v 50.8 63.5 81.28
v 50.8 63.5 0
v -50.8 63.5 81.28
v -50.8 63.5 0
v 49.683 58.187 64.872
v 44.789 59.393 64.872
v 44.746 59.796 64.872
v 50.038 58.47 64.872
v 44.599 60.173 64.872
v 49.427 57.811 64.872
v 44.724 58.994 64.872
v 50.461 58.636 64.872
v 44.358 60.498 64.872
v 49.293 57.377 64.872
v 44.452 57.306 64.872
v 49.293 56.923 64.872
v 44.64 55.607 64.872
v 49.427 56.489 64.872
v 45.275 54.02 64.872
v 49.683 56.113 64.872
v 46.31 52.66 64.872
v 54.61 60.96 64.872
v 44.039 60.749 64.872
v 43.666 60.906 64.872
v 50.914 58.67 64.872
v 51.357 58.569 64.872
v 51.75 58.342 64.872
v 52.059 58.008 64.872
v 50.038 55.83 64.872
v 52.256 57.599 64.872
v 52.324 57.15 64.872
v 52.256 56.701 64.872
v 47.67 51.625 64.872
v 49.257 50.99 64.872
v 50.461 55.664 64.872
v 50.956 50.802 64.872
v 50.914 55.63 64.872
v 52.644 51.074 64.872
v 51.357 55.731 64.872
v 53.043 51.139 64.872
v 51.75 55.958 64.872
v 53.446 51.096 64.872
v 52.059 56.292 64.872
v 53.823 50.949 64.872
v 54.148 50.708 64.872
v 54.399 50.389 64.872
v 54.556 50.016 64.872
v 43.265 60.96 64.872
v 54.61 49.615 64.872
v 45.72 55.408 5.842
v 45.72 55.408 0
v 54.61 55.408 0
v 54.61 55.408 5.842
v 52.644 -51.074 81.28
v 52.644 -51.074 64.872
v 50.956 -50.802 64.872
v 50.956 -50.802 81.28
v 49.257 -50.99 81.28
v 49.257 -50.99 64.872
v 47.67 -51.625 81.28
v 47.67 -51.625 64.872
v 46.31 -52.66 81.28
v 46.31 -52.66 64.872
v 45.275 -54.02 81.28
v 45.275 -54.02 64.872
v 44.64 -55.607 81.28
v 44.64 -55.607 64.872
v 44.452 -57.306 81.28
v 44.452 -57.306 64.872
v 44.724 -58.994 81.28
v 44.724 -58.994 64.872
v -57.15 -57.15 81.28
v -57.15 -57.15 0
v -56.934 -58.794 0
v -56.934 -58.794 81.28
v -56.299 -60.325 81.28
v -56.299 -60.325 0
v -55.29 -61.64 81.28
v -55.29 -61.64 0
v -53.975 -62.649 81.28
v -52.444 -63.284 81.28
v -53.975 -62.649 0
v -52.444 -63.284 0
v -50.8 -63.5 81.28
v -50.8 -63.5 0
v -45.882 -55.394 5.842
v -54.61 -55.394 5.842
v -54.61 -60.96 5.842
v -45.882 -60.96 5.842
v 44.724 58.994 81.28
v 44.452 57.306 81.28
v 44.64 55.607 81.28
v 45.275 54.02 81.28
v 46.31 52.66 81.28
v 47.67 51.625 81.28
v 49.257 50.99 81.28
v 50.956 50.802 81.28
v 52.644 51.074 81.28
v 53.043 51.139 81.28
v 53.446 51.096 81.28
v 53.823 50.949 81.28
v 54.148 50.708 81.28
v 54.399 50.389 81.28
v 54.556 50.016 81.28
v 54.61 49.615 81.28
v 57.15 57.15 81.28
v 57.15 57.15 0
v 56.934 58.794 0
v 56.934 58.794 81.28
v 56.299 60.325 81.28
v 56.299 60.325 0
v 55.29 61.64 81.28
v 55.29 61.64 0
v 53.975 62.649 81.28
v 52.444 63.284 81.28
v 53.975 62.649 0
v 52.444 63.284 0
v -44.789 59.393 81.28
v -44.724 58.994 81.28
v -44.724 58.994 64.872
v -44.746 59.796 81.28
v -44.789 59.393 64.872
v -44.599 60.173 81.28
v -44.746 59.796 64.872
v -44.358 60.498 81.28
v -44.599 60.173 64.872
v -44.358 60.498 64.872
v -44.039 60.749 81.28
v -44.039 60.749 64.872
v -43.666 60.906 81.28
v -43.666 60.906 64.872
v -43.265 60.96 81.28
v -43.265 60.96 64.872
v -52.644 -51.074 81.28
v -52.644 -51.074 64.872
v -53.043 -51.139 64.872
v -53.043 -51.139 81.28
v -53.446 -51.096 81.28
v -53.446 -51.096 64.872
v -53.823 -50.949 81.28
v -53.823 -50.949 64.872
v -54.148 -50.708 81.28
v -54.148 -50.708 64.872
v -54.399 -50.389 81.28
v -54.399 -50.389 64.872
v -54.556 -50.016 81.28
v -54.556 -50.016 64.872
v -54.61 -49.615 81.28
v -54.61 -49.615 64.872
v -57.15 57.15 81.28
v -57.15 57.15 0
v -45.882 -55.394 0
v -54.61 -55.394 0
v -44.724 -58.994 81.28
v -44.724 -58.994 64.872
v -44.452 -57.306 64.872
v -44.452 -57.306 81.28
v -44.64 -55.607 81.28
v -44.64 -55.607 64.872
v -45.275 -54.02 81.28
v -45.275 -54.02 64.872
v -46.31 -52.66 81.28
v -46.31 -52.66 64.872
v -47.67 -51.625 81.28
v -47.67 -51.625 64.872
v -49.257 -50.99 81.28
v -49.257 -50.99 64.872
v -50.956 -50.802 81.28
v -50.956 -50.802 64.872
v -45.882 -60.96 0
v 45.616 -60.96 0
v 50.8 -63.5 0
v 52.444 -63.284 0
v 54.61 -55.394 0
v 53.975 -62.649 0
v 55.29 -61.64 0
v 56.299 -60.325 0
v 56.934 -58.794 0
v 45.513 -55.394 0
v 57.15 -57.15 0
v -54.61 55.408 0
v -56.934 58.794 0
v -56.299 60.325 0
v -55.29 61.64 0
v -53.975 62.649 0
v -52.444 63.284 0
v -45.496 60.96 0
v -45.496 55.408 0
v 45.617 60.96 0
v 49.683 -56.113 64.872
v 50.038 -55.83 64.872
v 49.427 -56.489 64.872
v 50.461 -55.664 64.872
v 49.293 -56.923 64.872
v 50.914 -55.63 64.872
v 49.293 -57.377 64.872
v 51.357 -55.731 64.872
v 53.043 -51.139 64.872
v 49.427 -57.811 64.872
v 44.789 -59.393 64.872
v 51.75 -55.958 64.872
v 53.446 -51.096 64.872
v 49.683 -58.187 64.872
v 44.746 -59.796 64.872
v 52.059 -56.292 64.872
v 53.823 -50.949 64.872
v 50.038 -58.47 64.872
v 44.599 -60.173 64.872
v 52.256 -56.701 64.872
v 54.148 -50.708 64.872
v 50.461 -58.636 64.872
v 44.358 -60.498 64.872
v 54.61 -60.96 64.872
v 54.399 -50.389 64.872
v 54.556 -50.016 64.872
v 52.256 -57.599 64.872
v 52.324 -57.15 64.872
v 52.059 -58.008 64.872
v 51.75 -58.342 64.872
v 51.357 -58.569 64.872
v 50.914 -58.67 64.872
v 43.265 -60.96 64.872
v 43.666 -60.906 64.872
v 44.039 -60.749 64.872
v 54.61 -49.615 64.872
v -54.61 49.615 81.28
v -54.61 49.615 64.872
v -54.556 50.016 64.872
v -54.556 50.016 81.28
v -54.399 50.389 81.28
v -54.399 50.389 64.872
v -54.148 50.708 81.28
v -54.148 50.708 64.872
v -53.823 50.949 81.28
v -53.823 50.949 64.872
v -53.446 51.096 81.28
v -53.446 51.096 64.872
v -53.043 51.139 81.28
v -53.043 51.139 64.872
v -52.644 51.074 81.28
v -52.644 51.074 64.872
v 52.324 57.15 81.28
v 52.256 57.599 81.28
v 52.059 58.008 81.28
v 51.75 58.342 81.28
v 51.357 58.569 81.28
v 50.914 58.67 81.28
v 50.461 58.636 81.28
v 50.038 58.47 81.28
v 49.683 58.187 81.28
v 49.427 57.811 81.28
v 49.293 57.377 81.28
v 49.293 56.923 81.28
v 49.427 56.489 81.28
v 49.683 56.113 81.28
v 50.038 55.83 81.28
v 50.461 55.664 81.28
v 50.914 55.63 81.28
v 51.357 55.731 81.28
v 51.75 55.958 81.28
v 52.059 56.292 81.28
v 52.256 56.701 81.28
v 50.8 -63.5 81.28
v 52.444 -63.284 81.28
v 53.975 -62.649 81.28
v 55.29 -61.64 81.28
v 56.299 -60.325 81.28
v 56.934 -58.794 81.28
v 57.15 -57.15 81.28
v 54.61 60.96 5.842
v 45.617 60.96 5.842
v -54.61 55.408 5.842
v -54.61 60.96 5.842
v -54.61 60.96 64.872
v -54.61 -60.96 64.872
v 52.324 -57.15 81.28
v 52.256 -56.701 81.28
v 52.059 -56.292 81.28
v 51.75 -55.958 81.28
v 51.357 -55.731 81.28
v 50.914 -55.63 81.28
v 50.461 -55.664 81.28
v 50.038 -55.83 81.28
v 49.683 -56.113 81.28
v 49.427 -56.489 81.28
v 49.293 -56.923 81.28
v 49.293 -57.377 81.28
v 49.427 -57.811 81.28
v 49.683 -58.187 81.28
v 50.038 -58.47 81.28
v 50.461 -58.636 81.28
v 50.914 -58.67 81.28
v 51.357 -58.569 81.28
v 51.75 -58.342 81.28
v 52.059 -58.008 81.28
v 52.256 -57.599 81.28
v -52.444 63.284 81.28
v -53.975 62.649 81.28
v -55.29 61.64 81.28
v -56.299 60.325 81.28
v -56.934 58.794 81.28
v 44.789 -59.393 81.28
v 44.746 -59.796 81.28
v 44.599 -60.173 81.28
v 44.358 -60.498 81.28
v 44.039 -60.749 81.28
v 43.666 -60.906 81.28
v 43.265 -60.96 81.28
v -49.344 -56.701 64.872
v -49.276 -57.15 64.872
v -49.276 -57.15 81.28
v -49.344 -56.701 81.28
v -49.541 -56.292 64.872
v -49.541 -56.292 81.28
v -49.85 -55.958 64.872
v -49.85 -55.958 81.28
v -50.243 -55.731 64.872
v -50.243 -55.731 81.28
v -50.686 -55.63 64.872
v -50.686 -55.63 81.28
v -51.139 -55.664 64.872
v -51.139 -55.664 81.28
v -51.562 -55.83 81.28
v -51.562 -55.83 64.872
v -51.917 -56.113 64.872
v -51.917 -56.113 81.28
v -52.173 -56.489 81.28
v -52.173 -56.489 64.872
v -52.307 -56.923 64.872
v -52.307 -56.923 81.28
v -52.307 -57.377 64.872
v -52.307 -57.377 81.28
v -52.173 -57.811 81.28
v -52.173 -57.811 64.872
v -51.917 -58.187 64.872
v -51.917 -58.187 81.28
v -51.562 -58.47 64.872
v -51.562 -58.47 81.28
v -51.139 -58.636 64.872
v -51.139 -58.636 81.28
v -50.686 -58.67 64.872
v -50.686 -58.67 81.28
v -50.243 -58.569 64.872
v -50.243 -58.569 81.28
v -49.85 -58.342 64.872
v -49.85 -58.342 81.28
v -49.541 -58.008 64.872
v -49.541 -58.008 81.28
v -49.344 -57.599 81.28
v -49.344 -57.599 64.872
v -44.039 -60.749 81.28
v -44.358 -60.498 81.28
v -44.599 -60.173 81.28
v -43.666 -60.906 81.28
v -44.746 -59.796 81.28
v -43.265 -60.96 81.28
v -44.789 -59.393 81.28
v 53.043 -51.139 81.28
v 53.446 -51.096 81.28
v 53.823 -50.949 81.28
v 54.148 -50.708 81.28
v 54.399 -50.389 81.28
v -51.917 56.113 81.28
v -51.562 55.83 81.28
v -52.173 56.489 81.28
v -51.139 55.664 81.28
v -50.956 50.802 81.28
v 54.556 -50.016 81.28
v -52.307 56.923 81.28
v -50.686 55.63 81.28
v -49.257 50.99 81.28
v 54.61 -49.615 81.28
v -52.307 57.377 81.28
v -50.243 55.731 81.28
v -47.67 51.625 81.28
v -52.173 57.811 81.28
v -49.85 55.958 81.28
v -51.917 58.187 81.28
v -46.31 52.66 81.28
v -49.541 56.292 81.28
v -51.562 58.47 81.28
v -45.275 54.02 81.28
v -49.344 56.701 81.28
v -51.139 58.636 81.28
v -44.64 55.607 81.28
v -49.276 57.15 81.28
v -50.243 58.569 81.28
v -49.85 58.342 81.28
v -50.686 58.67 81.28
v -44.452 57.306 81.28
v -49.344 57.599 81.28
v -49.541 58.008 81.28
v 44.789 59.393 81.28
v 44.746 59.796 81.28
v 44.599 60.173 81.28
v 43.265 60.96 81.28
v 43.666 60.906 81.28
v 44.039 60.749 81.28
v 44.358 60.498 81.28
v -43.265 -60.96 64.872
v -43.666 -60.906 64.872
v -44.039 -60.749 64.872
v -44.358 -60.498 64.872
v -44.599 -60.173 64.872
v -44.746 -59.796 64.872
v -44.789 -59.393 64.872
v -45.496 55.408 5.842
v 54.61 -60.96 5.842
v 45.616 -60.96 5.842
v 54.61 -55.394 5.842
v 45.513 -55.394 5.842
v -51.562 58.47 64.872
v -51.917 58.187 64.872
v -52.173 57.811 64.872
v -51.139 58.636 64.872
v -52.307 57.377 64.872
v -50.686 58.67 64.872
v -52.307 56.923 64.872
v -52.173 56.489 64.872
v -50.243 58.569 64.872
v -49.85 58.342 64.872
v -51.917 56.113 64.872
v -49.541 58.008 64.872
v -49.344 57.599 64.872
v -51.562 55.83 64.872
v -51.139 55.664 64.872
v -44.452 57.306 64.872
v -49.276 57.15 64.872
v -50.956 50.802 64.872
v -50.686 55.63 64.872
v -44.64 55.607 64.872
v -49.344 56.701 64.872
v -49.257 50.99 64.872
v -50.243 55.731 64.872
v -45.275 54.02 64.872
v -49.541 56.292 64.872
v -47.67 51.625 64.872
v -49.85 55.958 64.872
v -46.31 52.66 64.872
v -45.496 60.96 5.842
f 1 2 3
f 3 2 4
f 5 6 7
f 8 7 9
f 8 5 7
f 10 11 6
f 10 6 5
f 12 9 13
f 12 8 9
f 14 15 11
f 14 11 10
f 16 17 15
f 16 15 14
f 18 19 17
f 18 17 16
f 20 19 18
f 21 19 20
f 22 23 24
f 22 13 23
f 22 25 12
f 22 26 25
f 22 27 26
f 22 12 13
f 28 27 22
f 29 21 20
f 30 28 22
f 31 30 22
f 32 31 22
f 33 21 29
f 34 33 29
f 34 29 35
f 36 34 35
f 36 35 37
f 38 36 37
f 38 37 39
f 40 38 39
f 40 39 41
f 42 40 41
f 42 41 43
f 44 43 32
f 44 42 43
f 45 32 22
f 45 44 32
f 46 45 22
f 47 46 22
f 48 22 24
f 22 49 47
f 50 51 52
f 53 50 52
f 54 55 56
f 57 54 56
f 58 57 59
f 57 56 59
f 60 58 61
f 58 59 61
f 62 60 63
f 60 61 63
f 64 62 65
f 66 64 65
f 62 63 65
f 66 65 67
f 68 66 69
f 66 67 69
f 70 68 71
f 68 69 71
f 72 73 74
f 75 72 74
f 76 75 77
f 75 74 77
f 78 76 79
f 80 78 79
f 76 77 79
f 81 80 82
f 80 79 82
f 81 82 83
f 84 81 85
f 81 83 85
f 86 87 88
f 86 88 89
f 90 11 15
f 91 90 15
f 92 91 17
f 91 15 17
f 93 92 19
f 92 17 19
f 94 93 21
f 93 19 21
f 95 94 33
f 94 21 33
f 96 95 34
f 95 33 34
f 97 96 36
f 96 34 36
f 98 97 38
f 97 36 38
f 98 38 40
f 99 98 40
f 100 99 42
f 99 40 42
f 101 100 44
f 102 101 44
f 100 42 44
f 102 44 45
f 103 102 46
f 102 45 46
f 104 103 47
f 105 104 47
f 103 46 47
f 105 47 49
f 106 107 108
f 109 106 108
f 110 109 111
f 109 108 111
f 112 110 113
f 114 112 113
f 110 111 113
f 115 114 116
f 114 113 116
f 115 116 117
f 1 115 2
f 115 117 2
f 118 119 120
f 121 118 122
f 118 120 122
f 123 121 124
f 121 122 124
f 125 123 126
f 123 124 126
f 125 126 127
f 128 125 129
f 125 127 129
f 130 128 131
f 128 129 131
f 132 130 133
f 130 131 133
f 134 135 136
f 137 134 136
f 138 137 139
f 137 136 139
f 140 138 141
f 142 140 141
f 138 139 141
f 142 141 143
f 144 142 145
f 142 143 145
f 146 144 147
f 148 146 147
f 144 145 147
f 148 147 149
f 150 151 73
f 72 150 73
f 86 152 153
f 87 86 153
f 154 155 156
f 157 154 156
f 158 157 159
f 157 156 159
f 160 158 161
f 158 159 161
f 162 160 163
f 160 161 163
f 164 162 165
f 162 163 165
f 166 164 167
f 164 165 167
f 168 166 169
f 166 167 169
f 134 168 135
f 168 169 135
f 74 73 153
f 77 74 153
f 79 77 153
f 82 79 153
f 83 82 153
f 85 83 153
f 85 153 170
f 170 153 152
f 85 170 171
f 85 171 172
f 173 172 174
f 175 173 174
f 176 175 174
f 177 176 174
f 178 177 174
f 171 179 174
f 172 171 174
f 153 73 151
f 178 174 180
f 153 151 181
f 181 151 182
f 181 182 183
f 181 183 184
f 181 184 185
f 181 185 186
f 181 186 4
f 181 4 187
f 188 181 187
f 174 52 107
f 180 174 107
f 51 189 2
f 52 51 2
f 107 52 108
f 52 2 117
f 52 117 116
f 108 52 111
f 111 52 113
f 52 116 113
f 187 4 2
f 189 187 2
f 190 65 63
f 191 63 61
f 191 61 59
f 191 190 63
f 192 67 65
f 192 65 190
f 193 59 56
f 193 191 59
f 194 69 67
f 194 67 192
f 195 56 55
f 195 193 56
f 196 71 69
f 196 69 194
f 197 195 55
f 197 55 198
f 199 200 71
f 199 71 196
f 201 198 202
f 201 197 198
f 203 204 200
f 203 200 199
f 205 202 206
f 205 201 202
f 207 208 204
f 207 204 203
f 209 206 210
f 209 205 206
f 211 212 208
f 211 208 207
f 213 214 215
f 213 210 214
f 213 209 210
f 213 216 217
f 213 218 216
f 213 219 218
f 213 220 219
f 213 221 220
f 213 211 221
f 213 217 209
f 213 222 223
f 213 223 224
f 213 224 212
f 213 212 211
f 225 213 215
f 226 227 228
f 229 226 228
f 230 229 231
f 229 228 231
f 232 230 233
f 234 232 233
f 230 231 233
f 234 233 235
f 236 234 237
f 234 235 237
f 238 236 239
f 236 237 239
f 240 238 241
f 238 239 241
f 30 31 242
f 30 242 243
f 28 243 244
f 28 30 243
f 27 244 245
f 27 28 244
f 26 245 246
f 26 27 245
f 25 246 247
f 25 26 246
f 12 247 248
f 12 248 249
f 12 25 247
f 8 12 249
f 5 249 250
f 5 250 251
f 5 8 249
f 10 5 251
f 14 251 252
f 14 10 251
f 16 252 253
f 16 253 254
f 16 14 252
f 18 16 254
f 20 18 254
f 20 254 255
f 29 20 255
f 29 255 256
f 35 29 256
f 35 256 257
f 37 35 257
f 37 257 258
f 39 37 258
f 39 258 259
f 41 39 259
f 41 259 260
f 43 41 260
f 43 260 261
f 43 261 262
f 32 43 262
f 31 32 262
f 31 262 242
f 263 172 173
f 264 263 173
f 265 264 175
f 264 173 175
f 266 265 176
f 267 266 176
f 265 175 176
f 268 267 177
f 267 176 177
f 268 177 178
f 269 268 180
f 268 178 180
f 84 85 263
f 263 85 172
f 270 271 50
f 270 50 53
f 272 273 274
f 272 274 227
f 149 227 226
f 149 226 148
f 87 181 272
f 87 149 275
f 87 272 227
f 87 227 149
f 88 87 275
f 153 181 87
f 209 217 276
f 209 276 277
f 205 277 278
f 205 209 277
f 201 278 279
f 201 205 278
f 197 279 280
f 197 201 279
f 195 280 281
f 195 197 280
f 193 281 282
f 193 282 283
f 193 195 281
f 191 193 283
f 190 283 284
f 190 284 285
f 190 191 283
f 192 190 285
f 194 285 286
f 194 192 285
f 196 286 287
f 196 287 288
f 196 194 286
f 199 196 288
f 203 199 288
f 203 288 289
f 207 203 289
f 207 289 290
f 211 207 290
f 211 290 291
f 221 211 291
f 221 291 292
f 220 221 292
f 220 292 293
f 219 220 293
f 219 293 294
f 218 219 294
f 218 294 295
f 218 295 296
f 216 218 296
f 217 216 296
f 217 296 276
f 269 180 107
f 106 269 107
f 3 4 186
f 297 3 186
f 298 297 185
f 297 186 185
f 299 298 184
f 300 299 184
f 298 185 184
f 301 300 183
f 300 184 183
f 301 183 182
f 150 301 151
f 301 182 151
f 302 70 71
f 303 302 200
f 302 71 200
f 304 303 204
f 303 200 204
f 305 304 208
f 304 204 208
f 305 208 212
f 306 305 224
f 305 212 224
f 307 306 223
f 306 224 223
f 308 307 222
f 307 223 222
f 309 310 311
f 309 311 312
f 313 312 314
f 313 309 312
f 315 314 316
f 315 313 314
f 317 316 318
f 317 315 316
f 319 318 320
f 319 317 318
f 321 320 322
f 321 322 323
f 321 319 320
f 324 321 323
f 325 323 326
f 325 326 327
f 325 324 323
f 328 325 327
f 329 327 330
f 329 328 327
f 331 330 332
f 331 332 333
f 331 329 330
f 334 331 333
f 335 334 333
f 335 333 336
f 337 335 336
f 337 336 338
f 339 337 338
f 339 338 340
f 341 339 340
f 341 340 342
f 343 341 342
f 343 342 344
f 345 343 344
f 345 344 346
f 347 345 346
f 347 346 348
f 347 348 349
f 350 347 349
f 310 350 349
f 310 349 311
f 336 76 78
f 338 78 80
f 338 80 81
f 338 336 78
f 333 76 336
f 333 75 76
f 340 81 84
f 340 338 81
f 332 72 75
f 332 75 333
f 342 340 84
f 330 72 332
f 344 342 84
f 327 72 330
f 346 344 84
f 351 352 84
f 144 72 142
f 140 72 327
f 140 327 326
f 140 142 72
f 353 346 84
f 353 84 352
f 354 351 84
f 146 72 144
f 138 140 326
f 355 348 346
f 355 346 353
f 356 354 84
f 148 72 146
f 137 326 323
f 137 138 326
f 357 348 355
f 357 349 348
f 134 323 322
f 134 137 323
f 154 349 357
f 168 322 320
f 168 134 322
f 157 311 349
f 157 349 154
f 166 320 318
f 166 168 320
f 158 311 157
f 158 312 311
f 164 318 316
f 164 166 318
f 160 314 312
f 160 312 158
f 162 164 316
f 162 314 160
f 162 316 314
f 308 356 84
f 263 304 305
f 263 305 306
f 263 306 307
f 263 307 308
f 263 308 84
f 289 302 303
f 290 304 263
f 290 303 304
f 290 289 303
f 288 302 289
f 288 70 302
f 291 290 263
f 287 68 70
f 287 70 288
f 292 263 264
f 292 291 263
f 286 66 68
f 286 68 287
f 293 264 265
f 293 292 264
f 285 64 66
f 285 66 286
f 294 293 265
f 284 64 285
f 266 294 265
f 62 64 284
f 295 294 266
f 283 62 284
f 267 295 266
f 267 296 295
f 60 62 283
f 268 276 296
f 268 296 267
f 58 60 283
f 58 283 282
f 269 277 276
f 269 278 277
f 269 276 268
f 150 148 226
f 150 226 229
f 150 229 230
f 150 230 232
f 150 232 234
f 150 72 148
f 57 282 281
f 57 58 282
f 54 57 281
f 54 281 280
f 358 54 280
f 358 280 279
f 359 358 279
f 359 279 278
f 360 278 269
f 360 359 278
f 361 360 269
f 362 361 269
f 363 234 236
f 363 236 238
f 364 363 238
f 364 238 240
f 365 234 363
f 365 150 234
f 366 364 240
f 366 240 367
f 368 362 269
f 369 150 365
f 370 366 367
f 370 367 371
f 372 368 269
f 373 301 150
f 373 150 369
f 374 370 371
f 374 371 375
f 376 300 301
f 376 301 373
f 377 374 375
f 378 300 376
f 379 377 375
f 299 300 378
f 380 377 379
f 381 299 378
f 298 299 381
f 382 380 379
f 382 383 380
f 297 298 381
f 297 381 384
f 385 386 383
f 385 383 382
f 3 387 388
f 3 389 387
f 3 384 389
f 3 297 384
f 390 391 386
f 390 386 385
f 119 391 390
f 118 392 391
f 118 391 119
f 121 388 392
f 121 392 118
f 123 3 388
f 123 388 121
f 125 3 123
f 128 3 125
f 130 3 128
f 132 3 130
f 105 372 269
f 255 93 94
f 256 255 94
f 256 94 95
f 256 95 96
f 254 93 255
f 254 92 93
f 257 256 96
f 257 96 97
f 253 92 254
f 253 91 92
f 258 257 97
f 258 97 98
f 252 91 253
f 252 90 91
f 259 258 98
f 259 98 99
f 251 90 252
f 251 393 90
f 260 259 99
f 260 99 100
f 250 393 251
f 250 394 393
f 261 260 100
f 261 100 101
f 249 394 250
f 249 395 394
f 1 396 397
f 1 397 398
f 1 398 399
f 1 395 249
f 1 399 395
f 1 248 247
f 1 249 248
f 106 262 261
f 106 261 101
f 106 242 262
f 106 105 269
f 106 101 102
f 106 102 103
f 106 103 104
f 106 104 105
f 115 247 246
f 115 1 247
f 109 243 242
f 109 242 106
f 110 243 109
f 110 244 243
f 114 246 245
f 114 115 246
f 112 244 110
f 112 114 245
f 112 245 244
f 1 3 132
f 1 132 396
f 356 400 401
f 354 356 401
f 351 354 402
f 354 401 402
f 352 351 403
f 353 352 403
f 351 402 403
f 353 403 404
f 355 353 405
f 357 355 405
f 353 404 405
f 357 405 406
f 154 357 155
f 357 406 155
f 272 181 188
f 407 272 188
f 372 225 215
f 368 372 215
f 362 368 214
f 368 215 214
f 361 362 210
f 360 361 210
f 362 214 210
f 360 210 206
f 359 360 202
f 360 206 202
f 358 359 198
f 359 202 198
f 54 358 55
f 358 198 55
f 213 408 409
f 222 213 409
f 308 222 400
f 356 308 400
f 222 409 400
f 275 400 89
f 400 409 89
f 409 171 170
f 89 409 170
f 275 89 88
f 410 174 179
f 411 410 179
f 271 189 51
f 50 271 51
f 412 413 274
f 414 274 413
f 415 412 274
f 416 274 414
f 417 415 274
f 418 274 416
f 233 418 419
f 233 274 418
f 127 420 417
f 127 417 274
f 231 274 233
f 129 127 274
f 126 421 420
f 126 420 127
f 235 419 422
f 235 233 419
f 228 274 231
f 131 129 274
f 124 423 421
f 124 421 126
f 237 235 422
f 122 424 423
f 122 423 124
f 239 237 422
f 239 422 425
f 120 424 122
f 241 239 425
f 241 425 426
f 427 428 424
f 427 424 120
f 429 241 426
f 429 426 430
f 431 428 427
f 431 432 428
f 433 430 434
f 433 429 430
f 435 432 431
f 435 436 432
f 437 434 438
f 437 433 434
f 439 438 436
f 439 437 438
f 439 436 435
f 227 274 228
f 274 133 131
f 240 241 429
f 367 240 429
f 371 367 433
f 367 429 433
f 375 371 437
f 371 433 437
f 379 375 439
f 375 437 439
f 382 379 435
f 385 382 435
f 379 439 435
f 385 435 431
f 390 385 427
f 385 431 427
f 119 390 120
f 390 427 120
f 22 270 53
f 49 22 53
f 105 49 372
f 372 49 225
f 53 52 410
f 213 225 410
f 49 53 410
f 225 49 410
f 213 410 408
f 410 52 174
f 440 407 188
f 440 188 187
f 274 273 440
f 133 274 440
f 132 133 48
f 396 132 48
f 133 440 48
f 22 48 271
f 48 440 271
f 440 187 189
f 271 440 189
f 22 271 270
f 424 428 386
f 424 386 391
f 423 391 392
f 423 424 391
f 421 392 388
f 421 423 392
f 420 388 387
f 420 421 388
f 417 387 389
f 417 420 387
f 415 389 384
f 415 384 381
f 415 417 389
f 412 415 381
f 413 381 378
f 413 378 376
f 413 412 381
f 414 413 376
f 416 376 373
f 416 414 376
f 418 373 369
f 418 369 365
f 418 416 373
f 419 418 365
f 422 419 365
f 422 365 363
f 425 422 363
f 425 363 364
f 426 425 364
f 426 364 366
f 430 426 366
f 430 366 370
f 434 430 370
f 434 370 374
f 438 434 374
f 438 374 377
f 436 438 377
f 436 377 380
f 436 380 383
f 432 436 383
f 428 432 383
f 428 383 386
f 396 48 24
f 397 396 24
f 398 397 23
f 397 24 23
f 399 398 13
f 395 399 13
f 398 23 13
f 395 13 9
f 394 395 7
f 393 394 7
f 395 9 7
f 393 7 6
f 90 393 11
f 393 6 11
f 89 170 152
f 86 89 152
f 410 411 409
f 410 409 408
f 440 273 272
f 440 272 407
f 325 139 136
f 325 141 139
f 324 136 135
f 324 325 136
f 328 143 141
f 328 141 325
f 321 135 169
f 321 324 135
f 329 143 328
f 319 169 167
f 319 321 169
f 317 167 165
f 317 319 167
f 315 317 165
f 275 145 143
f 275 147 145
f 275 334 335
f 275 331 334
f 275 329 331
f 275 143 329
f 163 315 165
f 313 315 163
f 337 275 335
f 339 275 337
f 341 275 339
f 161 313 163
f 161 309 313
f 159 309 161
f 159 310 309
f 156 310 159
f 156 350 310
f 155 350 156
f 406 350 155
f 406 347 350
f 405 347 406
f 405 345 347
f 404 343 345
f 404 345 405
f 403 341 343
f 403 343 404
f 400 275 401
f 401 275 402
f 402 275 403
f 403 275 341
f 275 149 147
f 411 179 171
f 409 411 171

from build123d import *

# Parameters (mm, degrees)
F0_R     = 1.524
F1_DEPTH = 81.28
F2_W     = 13.3946808136
F2_H     = 17.3983402467
F2_W_2   = 15.2697945094
F2_H_2   = 13.5166846132
F3_DEPTH = 64.8716
F5_DEPTH = 5.842


# Not quite as in the source:
# - ends of sketch curves that miss each other by under 0.0002 mm in the source are joined


with BuildPart() as f1:
    # F0 (on Top) → F1 (new body)
    with BuildSketch(Plane.XY):
        with BuildLine():
            Line((57.15, -57.15), (57.15, 57.15))
            ThreePointArc((57.15, 57.15), (55.2901280605, 61.6401280605), (50.8, 63.5))
            Line((50.8, 63.5), (-50.8, 63.5))
            ThreePointArc((-50.8, 63.5), (-55.2901280605, 61.6401280605), (-57.15, 57.15))
            Line((-57.15, 57.15), (-57.15, -57.15))
            ThreePointArc((-57.15, -57.15), (-55.2901280605, -61.6401280605), (-50.8, -63.5))
            Line((-50.8, -63.5), (50.8, -63.5))
            ThreePointArc((50.8, -63.5), (55.2901280605, -61.6401280605), (57.15, -57.15))
        make_face()
        with Locations((-50.8, -57.15)):
            Circle(F0_R, mode=Mode.SUBTRACT)
        with Locations((50.8, -57.15)):
            Circle(F0_R, mode=Mode.SUBTRACT)
        with Locations((-50.8, 57.15)):
            Circle(F0_R, mode=Mode.SUBTRACT)
        with BuildLine():
            Line((-43.2651408, 60.96), (43.2651408, 60.96))
            ThreePointArc((43.2651408, 60.96), (44.4892438959, 60.34382576), (44.7235034291, 58.993558544))
            ThreePointArc((44.7235034291, 58.993558544), (46.3098719395, 52.6598719395), (52.643558117, 51.0735048367))
            ThreePointArc((52.643558117, 51.0735048367), (53.99382576, 50.8392438959), (54.61, 49.6151408))
            Line((54.61, 49.6151408), (54.61, -49.6151408))
            ThreePointArc((54.61, -49.6151408), (53.99382576, -50.8392438959), (52.643558544, -51.0735034291))
            ThreePointArc((52.643558544, -51.0735034291), (46.3098719395, -52.6598719395), (44.7235048367, -58.993558117))
            ThreePointArc((44.7235048367, -58.993558117), (44.4892438959, -60.34382576), (43.2651408, -60.96))
            Line((43.2651408, -60.96), (-43.2651408, -60.96))
            ThreePointArc((-43.2651408, -60.96), (-44.4892438959, -60.34382576), (-44.7235034291, -58.993558544))
            ThreePointArc((-44.7235034291, -58.993558544), (-46.3098719395, -52.6598719395), (-52.643558117, -51.0735048367))
            ThreePointArc((-52.643558117, -51.0735048367), (-53.99382576, -50.8392438959), (-54.61, -49.6151408))
            Line((-54.61, -49.6151408), (-54.61, 49.6151408))
            ThreePointArc((-54.61, 49.6151408), (-53.99382576, 50.8392438959), (-52.643558544, 51.0735034291))
            ThreePointArc((-52.643558544, 51.0735034291), (-46.3098719395, 52.6598719395), (-44.7235048367, 58.993558117))
            ThreePointArc((-44.7235048367, 58.993558117), (-44.4892438959, 60.34382576), (-43.2651408, 60.96))
        make_face(mode=Mode.SUBTRACT)
        with Locations((50.8, 57.15)):
            Circle(F0_R, mode=Mode.SUBTRACT)
    extrude(amount=F1_DEPTH)

    # F2 (on face) → F3 (cut)
    with BuildSketch(Plane(origin=(0, 0, 0), x_dir=(1, 0, 0), z_dir=(0, 0, -1))):
        with Locations((47.9126595932, 52.2608298767)):
            Rectangle(F2_W, F2_H)
        Polygon((-54.61, 60.96), (-54.61, 45.5632209778), (-42.4256250262, 45.9913872182), (-42.4256250262, 60.96), align=None)
        Polygon((37.4062317246, -45.9566726098), (37.9334576428, -60.96), (54.61, -60.96), (54.61, -45.9566726098), align=None)
        with Locations((-46.9751027453, -54.2016576934)):
            Rectangle(F2_W_2, F2_H_2)
    extrude(amount=-F3_DEPTH, mode=Mode.SUBTRACT)

    # F4 (on Top) → F5 (join)
    with BuildSketch(Plane.XY):
        Polygon((-45.8822585642, -55.3943701088), (-55.0047931408, -55.3943701088), (-54.9012337958, -60.975112021), (-45.8822585642, -60.975112021), align=None)
        Polygon((-45.4961853886, 60.9891191125), (-54.7619216034, 60.9891191125), (-54.6583622584, 55.4083772004), (-45.4961853886, 55.4083772004), align=None)
        Polygon((54.7389825022, 60.9891191125), (45.6164479256, 60.9891191125), (45.7200072706, 55.4083772004), (54.7389825022, 55.4083772004), align=None)
        Polygon((54.6354231571, -55.3943701088), (45.5128885806, -55.3943701088), (45.6164479256, -60.975112021), (54.6354231571, -60.975112021), align=None)
    extrude(amount=F5_DEPTH)


solid = f1.part
